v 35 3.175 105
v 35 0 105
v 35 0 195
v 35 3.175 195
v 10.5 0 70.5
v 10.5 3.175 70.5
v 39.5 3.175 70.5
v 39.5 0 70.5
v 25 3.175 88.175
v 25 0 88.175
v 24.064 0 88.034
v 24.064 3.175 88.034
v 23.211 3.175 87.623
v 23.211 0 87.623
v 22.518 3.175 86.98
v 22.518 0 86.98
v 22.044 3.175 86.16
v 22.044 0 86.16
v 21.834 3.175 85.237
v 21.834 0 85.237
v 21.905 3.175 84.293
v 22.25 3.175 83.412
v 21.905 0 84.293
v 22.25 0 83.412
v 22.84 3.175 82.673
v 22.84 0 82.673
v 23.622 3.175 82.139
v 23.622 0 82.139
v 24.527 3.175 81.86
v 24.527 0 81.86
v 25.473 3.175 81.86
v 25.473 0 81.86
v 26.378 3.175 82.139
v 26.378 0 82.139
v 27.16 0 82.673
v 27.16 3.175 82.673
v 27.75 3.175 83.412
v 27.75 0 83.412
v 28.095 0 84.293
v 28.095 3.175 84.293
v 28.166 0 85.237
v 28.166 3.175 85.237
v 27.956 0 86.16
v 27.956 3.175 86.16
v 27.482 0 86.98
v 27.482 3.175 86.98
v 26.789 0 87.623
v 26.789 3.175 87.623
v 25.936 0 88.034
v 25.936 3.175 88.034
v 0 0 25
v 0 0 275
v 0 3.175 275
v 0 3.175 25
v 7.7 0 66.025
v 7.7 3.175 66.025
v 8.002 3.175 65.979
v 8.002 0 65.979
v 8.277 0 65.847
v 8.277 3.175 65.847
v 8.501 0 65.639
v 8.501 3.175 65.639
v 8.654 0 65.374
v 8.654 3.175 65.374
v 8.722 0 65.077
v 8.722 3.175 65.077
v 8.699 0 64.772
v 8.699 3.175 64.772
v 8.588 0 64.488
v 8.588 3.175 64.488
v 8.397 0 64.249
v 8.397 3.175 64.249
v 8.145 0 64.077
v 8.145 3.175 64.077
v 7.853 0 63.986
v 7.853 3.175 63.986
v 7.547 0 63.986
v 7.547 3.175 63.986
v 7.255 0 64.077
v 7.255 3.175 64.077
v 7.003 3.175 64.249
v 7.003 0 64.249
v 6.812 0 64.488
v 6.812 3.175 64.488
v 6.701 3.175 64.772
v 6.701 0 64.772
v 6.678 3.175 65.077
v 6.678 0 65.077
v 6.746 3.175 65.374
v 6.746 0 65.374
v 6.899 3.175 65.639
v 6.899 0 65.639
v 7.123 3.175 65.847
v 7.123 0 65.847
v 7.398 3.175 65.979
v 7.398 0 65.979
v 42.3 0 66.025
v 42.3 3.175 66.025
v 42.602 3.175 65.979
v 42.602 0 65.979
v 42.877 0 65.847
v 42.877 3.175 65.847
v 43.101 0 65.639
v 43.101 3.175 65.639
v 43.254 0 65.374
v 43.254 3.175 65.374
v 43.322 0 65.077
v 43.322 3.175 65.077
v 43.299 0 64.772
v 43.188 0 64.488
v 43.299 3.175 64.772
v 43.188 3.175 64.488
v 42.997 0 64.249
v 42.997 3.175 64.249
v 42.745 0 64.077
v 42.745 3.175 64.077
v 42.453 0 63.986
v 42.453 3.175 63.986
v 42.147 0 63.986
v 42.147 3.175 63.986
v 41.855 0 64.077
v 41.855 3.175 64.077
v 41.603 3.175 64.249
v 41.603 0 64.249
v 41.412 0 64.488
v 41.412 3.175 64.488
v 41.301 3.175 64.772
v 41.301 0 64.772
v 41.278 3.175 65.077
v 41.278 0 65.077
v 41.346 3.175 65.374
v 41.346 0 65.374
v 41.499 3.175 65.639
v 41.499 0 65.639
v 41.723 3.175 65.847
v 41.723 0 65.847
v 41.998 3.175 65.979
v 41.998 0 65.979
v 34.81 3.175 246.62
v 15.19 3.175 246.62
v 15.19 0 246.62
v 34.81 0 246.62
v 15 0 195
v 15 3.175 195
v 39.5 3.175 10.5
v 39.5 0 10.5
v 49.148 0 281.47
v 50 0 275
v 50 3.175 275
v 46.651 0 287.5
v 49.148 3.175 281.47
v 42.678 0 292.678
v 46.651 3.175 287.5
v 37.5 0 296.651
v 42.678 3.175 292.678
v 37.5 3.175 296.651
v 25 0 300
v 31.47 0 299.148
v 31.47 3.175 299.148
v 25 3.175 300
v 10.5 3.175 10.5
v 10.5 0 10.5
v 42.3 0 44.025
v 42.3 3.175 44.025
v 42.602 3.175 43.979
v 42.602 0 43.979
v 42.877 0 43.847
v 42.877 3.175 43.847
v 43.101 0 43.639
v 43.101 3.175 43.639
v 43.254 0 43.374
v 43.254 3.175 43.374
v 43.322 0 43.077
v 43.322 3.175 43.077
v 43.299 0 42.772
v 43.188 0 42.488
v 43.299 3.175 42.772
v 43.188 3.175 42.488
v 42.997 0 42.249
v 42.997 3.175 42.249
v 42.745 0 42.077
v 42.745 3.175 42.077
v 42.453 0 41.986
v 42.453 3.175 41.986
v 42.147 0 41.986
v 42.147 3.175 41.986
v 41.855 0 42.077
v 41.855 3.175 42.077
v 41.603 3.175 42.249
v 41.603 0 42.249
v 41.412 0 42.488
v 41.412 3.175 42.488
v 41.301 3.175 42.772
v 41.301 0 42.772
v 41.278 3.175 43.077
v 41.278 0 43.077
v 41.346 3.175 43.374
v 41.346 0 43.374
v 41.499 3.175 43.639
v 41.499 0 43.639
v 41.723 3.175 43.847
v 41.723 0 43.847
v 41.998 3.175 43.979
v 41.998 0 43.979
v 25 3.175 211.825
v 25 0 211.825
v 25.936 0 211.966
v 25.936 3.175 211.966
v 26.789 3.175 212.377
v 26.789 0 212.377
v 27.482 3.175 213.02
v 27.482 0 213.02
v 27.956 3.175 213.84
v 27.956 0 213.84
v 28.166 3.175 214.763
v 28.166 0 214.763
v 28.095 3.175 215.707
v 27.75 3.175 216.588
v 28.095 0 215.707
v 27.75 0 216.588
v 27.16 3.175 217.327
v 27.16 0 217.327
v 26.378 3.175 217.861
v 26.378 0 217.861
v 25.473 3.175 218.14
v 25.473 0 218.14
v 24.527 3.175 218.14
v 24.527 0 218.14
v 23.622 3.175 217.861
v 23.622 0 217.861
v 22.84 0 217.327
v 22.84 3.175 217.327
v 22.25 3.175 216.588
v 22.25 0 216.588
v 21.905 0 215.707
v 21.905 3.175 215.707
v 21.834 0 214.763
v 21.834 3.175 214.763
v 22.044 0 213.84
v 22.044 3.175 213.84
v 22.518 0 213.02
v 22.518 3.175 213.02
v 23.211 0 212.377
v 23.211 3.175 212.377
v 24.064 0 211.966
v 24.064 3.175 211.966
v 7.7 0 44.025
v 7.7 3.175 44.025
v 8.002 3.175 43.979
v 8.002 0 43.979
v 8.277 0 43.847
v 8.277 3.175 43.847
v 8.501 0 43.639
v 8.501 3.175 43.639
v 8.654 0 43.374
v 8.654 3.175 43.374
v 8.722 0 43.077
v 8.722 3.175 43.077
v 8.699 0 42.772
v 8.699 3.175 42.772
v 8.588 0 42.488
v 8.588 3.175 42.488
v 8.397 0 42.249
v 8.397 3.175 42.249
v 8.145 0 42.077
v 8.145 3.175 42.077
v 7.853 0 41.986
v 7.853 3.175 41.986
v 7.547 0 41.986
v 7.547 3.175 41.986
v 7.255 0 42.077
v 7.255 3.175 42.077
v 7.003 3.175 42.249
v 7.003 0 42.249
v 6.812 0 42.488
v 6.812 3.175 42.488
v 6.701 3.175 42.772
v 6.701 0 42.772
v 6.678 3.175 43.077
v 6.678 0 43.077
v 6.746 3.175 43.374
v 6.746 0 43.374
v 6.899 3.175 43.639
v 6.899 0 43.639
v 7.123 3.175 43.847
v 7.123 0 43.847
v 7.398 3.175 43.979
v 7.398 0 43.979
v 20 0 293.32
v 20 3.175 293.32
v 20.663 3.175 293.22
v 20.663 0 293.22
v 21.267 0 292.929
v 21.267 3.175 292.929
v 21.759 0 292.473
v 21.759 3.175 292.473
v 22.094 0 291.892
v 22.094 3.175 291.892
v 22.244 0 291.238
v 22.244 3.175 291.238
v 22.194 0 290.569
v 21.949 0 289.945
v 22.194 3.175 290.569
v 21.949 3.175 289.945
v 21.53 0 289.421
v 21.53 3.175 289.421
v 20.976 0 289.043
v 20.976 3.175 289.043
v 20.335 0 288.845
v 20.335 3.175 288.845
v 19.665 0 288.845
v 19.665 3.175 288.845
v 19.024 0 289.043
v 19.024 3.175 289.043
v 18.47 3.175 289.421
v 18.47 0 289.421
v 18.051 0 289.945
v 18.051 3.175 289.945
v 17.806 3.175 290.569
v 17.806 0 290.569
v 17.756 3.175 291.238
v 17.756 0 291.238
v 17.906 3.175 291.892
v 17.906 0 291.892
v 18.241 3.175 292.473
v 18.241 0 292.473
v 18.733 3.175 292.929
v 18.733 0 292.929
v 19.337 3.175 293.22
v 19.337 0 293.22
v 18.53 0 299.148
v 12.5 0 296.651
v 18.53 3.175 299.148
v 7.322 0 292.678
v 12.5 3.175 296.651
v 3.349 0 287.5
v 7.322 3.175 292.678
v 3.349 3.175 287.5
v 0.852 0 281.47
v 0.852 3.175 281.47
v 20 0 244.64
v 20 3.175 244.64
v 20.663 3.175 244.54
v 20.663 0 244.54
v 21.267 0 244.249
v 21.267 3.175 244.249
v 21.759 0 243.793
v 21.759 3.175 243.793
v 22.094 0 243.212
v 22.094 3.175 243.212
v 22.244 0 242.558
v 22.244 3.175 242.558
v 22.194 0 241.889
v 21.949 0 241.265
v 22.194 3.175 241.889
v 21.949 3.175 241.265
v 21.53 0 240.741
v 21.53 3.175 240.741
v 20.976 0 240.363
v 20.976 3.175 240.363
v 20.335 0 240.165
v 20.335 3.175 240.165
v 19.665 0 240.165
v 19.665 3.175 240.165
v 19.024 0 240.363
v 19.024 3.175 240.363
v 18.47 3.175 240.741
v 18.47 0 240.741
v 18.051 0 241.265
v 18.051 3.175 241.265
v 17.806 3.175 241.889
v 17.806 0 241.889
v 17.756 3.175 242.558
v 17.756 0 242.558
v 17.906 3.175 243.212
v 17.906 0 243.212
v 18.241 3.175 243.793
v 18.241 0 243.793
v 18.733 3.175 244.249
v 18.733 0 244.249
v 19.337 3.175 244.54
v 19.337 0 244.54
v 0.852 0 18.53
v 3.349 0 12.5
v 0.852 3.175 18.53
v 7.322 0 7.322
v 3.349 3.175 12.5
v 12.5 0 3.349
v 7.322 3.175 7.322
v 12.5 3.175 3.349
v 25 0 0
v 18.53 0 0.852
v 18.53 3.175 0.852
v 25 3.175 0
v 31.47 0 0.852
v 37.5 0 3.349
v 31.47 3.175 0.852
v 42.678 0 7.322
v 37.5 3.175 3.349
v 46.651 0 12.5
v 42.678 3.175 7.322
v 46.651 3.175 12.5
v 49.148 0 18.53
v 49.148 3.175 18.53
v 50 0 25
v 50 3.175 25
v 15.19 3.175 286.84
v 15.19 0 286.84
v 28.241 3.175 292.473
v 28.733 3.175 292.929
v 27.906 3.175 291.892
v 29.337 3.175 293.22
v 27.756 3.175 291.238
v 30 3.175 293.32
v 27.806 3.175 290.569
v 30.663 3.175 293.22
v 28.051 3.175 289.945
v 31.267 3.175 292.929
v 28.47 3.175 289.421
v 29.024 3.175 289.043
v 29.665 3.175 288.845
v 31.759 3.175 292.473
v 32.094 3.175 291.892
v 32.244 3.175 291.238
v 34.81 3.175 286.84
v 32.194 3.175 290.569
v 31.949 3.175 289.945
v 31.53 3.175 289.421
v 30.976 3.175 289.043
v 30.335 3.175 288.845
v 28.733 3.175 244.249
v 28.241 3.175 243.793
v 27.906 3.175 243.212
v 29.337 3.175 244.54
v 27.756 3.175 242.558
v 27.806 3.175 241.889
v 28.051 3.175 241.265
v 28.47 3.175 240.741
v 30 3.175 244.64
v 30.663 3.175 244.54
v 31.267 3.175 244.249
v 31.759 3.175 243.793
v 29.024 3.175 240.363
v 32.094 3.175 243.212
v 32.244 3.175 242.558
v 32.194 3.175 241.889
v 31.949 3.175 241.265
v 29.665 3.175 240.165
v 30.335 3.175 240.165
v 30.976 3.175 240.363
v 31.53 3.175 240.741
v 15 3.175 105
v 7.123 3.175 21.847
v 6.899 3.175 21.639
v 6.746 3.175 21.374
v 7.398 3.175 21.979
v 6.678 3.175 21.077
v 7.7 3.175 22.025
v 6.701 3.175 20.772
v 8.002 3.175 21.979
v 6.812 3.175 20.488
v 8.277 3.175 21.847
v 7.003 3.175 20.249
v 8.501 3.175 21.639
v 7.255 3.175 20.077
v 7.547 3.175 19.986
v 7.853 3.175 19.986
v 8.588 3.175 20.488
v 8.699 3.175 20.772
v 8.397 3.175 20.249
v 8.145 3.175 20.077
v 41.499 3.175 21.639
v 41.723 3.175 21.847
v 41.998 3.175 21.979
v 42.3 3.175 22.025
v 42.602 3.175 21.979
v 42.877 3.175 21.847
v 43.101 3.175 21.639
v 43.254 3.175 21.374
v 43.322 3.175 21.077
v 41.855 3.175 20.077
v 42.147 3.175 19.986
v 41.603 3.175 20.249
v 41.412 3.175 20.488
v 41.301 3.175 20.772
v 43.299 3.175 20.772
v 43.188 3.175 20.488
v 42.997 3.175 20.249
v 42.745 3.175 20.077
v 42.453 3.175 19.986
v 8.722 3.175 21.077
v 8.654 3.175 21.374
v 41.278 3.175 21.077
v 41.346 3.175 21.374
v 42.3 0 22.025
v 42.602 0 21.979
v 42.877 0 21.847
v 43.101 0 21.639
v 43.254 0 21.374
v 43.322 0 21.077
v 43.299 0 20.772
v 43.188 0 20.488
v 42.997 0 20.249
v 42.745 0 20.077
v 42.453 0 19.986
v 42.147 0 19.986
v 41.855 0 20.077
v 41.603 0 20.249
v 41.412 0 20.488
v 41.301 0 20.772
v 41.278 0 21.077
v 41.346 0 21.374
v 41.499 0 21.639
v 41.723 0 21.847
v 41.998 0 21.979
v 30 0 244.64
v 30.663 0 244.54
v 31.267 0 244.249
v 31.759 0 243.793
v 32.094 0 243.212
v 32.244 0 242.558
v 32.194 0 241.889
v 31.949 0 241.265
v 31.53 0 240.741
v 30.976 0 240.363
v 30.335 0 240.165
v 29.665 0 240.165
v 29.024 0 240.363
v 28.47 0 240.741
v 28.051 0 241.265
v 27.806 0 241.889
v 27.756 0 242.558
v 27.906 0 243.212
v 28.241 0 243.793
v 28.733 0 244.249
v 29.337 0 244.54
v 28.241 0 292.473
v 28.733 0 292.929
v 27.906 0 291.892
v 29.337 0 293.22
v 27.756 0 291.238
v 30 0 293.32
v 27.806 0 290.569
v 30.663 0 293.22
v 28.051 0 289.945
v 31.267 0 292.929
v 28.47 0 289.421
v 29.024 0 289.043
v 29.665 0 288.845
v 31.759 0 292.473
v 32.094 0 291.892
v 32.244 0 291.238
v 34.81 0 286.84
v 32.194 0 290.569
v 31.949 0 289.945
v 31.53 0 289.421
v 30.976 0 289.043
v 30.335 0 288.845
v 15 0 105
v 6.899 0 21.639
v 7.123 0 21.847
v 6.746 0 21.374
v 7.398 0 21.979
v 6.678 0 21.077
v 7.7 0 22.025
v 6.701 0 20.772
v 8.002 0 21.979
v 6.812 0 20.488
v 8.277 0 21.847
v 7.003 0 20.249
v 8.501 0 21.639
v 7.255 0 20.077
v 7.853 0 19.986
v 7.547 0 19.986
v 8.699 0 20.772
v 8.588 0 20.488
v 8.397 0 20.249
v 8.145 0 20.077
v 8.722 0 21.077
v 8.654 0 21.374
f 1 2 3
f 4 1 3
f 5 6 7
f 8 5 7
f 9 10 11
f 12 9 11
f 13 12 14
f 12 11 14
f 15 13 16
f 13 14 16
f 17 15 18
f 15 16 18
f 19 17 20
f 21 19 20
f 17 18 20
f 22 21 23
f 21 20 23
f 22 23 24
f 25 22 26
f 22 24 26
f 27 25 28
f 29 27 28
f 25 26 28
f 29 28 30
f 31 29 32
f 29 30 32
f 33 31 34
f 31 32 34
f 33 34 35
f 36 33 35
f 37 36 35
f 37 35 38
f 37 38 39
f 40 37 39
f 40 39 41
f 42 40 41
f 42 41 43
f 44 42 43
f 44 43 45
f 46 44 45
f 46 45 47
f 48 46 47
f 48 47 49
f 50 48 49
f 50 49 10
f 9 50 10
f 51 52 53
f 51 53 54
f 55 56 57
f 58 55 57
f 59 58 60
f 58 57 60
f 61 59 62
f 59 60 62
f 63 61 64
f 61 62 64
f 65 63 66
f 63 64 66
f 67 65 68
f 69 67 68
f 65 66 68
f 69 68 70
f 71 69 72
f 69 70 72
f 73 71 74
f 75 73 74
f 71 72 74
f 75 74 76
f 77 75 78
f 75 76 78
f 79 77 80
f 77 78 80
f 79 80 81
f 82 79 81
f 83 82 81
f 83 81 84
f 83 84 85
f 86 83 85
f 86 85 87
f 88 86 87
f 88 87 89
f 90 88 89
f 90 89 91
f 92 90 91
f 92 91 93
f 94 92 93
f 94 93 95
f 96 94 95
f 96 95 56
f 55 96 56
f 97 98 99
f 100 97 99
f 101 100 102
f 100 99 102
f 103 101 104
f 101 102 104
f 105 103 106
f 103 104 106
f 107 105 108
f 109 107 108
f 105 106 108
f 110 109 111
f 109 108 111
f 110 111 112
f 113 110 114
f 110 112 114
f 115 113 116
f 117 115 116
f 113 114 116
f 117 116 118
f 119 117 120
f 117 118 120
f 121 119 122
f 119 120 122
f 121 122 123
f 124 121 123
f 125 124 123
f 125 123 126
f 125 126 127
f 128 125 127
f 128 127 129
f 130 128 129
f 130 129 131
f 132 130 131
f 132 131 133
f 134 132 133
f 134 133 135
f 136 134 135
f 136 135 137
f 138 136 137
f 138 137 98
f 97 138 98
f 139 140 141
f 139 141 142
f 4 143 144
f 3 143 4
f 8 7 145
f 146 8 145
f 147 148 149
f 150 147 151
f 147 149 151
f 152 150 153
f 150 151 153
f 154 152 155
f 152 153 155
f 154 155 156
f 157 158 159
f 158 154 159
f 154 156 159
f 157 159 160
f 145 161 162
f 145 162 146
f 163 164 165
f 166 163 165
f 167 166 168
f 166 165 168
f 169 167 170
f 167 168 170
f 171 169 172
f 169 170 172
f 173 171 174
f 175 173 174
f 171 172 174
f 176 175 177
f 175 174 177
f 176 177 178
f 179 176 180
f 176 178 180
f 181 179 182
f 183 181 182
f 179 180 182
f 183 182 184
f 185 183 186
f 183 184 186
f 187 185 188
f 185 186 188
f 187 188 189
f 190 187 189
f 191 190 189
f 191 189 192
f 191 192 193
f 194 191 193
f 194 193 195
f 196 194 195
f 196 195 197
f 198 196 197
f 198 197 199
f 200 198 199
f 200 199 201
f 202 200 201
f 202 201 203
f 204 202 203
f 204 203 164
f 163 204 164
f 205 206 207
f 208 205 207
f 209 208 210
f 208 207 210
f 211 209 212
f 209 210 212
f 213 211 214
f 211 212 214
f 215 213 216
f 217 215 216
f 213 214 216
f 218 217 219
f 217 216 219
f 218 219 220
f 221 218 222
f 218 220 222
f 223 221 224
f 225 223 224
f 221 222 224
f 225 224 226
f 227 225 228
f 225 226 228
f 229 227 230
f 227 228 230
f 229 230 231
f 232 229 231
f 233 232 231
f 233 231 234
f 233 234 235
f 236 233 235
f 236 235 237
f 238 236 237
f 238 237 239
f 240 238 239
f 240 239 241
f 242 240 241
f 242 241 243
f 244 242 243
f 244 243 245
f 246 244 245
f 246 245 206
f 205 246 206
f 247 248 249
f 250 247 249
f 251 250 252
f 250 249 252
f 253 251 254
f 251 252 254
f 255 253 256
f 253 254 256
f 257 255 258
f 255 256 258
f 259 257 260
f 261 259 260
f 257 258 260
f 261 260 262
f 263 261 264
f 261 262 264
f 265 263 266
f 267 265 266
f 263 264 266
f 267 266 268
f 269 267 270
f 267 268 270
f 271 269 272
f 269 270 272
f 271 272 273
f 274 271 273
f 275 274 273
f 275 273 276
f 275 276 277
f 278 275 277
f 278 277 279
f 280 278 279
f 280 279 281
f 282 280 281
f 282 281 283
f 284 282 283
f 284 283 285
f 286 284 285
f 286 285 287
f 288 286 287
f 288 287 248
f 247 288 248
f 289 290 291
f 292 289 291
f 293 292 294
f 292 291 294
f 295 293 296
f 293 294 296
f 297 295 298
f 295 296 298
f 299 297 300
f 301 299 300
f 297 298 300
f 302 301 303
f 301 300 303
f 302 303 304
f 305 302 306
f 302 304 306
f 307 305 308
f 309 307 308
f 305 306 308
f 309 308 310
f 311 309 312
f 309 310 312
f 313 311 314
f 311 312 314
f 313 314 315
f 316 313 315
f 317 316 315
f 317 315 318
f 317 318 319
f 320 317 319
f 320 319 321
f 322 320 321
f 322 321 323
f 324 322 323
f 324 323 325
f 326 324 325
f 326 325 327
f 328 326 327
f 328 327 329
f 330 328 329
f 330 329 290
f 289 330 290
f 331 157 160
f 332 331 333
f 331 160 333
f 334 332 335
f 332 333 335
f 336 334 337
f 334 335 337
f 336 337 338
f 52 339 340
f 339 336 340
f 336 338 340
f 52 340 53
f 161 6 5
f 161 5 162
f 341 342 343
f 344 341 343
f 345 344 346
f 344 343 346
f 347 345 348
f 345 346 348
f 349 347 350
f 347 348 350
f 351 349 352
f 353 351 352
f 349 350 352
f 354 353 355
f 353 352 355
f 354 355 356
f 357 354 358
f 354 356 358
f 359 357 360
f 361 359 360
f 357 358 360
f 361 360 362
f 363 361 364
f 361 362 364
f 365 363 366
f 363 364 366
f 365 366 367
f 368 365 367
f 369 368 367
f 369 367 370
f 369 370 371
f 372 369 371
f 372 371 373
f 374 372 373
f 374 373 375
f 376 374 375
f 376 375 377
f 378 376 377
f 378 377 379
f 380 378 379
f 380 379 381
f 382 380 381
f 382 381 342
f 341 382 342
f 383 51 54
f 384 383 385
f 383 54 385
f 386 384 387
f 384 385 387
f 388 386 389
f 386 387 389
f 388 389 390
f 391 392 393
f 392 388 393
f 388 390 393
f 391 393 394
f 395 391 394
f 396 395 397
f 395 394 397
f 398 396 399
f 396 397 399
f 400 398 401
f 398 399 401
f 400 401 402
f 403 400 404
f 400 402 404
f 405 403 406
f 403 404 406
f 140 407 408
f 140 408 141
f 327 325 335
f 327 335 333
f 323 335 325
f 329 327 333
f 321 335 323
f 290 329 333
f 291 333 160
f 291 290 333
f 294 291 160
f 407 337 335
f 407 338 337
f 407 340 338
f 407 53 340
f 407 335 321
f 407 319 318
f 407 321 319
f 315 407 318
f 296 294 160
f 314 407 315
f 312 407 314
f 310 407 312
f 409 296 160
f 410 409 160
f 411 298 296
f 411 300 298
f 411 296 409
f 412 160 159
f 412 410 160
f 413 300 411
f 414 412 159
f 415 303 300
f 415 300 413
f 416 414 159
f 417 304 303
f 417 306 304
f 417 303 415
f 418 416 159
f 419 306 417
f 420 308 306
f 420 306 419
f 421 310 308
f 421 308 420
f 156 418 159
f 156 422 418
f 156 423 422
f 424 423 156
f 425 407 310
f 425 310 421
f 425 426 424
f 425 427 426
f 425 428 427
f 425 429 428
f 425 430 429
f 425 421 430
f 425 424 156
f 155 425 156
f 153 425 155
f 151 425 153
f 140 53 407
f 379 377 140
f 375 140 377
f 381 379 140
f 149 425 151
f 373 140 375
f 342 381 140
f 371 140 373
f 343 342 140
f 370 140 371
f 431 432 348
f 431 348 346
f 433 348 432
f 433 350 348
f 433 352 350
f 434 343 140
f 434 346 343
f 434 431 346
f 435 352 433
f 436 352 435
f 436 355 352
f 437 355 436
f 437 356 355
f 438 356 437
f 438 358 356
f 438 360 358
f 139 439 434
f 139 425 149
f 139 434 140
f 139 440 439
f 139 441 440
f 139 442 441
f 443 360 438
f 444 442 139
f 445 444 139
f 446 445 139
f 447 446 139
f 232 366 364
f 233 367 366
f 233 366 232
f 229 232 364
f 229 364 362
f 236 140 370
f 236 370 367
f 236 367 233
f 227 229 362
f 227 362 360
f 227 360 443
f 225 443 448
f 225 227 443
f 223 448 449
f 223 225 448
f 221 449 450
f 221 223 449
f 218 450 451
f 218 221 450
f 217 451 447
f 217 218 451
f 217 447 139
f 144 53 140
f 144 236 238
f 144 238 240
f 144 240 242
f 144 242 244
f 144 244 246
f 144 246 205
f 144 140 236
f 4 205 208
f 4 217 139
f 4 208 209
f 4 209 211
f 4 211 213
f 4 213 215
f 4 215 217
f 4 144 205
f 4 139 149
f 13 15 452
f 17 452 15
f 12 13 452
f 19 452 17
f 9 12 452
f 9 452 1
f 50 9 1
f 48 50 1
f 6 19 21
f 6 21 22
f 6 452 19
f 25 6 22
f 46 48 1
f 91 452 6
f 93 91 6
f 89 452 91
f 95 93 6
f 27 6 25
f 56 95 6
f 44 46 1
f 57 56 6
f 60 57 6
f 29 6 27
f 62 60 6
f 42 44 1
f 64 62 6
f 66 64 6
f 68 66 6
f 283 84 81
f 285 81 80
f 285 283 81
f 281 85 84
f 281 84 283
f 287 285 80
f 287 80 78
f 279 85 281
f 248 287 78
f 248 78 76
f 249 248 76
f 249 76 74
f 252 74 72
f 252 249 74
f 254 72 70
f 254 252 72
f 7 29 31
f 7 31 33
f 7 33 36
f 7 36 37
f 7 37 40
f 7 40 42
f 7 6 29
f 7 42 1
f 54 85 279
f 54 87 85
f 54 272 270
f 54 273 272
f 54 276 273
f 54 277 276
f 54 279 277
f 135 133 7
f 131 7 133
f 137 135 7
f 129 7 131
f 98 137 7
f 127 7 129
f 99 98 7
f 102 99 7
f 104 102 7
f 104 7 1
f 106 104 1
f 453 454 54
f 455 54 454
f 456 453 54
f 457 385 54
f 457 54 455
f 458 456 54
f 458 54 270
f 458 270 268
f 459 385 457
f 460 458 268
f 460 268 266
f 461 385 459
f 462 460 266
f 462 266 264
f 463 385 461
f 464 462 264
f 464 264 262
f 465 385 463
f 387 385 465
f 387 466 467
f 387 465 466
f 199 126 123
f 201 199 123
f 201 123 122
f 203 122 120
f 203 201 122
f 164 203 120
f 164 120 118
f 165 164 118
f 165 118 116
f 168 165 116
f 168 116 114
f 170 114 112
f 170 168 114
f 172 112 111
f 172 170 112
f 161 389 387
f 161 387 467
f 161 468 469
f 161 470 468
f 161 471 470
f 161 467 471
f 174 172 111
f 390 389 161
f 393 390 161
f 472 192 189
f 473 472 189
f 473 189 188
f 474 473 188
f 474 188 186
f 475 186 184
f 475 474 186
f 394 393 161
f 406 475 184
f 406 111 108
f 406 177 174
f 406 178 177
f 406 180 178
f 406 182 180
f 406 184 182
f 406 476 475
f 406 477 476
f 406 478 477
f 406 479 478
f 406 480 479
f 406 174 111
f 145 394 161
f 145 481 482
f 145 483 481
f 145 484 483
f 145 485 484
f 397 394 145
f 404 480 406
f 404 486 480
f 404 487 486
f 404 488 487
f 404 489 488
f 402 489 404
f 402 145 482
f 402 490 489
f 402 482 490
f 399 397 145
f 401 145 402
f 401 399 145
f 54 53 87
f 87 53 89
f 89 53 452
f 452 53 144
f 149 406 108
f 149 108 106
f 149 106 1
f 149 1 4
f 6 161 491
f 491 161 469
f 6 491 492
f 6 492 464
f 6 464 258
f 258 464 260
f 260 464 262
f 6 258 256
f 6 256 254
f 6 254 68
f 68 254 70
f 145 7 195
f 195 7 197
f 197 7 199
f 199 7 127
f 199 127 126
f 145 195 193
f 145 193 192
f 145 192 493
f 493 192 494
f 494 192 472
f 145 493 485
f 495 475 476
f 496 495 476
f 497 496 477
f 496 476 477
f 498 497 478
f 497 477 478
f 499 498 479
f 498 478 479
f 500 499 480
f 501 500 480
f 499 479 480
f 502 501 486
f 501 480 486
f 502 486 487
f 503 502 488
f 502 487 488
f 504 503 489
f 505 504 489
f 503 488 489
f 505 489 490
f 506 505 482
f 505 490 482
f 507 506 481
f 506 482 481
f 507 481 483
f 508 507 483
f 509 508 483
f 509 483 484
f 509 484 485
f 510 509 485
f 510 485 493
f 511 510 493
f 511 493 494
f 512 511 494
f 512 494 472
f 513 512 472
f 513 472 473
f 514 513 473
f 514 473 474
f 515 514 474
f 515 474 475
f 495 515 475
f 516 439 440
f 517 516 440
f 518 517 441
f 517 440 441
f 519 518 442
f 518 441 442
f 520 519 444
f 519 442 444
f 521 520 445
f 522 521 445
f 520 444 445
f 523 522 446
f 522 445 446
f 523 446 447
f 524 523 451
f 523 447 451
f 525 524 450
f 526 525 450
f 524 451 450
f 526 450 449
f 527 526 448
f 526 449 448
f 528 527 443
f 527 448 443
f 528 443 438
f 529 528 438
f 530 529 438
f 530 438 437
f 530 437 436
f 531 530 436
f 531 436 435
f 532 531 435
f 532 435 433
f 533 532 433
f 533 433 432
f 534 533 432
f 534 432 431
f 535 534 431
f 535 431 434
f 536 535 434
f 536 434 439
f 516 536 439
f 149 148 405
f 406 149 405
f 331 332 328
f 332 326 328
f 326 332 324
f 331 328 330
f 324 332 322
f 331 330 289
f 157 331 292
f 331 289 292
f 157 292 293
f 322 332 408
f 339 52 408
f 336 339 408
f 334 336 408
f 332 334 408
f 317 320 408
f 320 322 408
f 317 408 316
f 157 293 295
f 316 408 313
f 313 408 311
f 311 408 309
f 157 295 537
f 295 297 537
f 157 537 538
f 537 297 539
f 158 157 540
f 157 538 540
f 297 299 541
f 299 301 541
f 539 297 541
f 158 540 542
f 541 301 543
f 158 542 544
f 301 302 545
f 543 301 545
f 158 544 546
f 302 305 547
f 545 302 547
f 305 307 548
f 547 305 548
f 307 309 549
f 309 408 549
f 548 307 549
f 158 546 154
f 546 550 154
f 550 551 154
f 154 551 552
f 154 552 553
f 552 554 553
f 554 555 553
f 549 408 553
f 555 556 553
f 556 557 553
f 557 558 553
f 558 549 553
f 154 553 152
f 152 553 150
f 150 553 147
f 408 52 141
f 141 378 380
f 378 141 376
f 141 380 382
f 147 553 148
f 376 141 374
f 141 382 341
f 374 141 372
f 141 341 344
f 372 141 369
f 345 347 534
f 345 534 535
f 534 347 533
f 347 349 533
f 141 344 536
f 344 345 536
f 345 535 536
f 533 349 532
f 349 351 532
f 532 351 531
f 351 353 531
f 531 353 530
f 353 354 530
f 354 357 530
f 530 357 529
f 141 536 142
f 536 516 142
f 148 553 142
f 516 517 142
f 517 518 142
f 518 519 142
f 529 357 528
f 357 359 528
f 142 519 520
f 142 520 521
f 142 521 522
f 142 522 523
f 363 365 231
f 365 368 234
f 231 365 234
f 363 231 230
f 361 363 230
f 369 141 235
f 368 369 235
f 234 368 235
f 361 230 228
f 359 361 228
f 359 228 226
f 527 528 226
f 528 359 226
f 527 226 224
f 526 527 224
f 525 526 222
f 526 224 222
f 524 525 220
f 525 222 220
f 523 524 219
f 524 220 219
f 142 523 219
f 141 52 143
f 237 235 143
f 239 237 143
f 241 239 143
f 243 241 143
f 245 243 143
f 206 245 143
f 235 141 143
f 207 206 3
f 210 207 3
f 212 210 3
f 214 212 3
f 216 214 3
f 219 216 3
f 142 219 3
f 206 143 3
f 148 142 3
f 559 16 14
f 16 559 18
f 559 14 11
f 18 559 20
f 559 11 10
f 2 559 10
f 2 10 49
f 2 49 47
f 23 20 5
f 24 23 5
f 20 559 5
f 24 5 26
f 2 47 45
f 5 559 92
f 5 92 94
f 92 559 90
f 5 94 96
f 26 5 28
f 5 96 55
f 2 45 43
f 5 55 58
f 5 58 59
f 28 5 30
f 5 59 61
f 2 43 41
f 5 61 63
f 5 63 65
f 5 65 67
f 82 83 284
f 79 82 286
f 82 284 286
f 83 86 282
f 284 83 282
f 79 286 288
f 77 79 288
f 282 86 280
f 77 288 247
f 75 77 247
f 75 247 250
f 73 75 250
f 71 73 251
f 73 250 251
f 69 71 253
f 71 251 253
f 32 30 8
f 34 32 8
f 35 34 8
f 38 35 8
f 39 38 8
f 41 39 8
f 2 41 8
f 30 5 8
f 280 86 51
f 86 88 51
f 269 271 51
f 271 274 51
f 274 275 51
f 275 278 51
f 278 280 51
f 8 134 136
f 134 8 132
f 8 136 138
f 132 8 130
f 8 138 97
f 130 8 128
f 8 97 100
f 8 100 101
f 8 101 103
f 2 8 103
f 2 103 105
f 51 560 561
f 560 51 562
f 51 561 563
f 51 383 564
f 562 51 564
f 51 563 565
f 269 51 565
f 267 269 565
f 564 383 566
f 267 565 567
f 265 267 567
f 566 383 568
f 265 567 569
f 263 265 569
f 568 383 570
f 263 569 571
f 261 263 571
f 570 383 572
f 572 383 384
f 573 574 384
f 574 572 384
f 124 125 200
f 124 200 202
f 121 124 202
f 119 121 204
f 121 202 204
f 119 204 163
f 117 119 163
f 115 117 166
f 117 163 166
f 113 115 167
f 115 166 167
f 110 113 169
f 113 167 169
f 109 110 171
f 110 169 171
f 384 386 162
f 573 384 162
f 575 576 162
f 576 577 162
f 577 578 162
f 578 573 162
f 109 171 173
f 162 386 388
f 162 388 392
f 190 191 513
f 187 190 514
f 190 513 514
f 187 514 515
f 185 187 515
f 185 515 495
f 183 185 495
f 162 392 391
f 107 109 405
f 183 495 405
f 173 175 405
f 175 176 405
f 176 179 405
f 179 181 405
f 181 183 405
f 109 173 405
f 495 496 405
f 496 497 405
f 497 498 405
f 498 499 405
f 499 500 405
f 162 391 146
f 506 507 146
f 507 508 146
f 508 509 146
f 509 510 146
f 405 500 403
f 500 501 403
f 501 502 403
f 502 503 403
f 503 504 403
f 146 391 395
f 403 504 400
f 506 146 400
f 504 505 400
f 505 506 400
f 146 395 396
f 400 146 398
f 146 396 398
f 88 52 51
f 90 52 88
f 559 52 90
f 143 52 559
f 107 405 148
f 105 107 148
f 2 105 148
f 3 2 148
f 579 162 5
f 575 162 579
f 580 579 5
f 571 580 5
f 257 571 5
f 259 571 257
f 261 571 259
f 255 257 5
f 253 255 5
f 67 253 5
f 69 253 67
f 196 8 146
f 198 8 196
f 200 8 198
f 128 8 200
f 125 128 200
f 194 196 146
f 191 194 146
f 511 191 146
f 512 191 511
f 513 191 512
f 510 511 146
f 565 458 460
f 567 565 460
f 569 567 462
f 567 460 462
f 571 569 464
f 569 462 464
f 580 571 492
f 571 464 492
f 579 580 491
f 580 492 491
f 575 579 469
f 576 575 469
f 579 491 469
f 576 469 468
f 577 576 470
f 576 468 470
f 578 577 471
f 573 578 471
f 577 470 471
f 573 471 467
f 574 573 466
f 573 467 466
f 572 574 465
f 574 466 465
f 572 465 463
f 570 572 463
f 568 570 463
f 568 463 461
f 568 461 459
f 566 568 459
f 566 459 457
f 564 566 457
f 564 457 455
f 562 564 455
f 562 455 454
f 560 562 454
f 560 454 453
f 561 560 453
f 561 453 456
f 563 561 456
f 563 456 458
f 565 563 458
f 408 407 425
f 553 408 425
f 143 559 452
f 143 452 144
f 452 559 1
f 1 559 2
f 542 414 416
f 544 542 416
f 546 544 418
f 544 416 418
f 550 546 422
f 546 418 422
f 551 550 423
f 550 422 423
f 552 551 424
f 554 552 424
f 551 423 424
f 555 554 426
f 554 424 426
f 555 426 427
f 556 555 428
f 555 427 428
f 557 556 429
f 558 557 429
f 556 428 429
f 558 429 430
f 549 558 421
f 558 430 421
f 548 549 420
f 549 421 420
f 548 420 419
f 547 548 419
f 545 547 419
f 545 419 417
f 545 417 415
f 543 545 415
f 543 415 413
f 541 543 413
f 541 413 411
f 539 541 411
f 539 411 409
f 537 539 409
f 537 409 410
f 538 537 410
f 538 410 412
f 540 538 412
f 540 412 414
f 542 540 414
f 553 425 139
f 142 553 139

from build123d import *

# Parameters (mm, degrees)
SKETCH2_W           = 50
SKETCH2_H           = 300
BOSS_EXTRUDE1_DEPTH = 3.175
SKETCH3_R           = 1.025
SKETCH3_R_2         = 2.25
SKETCH3_W           = 29
SKETCH3_H           = 60
SKETCH3_W_2         = 19.62
SKETCH3_H_2         = 40.22
CUT_EXTRUDE1_DEPTH  = 6.35
CUT_EXTRUDE2_DEPTH  = 6.35
SKETCH5_R           = 3.175
SKETCH5_W           = 20
SKETCH5_H           = 90
CUT_EXTRUDE3_DEPTH  = 6.35


with BuildPart() as part:
    # Sketch2 → Boss-Extrude1 (new body)
    with BuildSketch(Plane(origin=(0, 0, 0), x_dir=(1, 0, 0), z_dir=(0, 1, 0))):
        with Locations((25, -150)):
            Rectangle(SKETCH2_W, SKETCH2_H)
    extrude(amount=BOSS_EXTRUDE1_DEPTH)

    # Sketch3 → Cut-Extrude1 (cut)
    with BuildSketch(Plane(origin=(0, 3.175, 0), x_dir=(1, 0, 0), z_dir=(0, 1, 0))):
        with Locations(Location((7.7, -21, 0), (0, 0, 270))):
            Circle(SKETCH3_R)
        with Locations(Location((7.7, -43, 0), (0, 0, 270))):
            Circle(SKETCH3_R)
        with Locations(Location((7.7, -65, 0), (0, 0, 270))):
            Circle(SKETCH3_R)
        with Locations(Location((42.3, -65, 0), (0, 0, 270))):
            Circle(SKETCH3_R)
        with Locations(Location((42.3, -43, 0), (0, 0, 270))):
            Circle(SKETCH3_R)
        with Locations(Location((42.3, -21, 0), (0, 0, 270))):
            Circle(SKETCH3_R)
        with Locations(Location((20, -291.07, 0), (0, 0, 270))):
            Circle(SKETCH3_R_2)
        with Locations(Location((30, -291.07, 0), (0, 0, 270))):
            Circle(SKETCH3_R_2)
        with Locations(Location((20, -242.39, 0), (0, 0, 270))):
            Circle(SKETCH3_R_2)
        with Locations(Location((30, -242.39, 0), (0, 0, 270))):
            Circle(SKETCH3_R_2)
        with Locations((25, -40.5)):
            Rectangle(SKETCH3_W, SKETCH3_H)
        with Locations((25, -266.73)):
            Rectangle(SKETCH3_W_2, SKETCH3_H_2)
    extrude(amount=-CUT_EXTRUDE1_DEPTH, mode=Mode.SUBTRACT)

    # Sketch4 → Cut-Extrude2 (cut)
    with BuildSketch(Plane(origin=(0, 3.175, 0), x_dir=(1, 0, 0), z_dir=(0, 1, 0))):
        with BuildLine():
            Line((0, 0), (0, -25))
            ThreePointArc((0, -25), (7.32233047, -7.32233047), (25, 0))
            Line((25, 0), (0, 0))
        make_face()
        with BuildLine():
            ThreePointArc((25, 0), (42.67766953, -7.32233047), (50, -25))
            Line((50, -25), (50, 0))
            Line((50, 0), (25, 0))
        make_face()
        with BuildLine():
            ThreePointArc((25, -300), (7.32233047, -292.67766953), (0, -275))
            Line((0, -275), (0, -300))
            Line((0, -300), (25, -300))
        make_face()
        with BuildLine():
            Line((50, -300), (50, -275))
            ThreePointArc((50, -275), (42.67766953, -292.67766953), (25, -300))
            Line((25, -300), (50, -300))
        make_face()
    extrude(amount=-CUT_EXTRUDE2_DEPTH, mode=Mode.SUBTRACT)

    # Sketch5 → Cut-Extrude3 (cut)
    with BuildSketch(Plane.XZ):
        with Locations(Location((25, 215, 0), (0, 0, 270))):
            Circle(SKETCH5_R)
        with Locations(Location((25, 85, 0), (0, 0, 90))):
            Circle(SKETCH5_R)
        with Locations((25, 150)):
            Rectangle(SKETCH5_W, SKETCH5_H)
    extrude(amount=-CUT_EXTRUDE3_DEPTH, mode=Mode.SUBTRACT)


solid = part.part
